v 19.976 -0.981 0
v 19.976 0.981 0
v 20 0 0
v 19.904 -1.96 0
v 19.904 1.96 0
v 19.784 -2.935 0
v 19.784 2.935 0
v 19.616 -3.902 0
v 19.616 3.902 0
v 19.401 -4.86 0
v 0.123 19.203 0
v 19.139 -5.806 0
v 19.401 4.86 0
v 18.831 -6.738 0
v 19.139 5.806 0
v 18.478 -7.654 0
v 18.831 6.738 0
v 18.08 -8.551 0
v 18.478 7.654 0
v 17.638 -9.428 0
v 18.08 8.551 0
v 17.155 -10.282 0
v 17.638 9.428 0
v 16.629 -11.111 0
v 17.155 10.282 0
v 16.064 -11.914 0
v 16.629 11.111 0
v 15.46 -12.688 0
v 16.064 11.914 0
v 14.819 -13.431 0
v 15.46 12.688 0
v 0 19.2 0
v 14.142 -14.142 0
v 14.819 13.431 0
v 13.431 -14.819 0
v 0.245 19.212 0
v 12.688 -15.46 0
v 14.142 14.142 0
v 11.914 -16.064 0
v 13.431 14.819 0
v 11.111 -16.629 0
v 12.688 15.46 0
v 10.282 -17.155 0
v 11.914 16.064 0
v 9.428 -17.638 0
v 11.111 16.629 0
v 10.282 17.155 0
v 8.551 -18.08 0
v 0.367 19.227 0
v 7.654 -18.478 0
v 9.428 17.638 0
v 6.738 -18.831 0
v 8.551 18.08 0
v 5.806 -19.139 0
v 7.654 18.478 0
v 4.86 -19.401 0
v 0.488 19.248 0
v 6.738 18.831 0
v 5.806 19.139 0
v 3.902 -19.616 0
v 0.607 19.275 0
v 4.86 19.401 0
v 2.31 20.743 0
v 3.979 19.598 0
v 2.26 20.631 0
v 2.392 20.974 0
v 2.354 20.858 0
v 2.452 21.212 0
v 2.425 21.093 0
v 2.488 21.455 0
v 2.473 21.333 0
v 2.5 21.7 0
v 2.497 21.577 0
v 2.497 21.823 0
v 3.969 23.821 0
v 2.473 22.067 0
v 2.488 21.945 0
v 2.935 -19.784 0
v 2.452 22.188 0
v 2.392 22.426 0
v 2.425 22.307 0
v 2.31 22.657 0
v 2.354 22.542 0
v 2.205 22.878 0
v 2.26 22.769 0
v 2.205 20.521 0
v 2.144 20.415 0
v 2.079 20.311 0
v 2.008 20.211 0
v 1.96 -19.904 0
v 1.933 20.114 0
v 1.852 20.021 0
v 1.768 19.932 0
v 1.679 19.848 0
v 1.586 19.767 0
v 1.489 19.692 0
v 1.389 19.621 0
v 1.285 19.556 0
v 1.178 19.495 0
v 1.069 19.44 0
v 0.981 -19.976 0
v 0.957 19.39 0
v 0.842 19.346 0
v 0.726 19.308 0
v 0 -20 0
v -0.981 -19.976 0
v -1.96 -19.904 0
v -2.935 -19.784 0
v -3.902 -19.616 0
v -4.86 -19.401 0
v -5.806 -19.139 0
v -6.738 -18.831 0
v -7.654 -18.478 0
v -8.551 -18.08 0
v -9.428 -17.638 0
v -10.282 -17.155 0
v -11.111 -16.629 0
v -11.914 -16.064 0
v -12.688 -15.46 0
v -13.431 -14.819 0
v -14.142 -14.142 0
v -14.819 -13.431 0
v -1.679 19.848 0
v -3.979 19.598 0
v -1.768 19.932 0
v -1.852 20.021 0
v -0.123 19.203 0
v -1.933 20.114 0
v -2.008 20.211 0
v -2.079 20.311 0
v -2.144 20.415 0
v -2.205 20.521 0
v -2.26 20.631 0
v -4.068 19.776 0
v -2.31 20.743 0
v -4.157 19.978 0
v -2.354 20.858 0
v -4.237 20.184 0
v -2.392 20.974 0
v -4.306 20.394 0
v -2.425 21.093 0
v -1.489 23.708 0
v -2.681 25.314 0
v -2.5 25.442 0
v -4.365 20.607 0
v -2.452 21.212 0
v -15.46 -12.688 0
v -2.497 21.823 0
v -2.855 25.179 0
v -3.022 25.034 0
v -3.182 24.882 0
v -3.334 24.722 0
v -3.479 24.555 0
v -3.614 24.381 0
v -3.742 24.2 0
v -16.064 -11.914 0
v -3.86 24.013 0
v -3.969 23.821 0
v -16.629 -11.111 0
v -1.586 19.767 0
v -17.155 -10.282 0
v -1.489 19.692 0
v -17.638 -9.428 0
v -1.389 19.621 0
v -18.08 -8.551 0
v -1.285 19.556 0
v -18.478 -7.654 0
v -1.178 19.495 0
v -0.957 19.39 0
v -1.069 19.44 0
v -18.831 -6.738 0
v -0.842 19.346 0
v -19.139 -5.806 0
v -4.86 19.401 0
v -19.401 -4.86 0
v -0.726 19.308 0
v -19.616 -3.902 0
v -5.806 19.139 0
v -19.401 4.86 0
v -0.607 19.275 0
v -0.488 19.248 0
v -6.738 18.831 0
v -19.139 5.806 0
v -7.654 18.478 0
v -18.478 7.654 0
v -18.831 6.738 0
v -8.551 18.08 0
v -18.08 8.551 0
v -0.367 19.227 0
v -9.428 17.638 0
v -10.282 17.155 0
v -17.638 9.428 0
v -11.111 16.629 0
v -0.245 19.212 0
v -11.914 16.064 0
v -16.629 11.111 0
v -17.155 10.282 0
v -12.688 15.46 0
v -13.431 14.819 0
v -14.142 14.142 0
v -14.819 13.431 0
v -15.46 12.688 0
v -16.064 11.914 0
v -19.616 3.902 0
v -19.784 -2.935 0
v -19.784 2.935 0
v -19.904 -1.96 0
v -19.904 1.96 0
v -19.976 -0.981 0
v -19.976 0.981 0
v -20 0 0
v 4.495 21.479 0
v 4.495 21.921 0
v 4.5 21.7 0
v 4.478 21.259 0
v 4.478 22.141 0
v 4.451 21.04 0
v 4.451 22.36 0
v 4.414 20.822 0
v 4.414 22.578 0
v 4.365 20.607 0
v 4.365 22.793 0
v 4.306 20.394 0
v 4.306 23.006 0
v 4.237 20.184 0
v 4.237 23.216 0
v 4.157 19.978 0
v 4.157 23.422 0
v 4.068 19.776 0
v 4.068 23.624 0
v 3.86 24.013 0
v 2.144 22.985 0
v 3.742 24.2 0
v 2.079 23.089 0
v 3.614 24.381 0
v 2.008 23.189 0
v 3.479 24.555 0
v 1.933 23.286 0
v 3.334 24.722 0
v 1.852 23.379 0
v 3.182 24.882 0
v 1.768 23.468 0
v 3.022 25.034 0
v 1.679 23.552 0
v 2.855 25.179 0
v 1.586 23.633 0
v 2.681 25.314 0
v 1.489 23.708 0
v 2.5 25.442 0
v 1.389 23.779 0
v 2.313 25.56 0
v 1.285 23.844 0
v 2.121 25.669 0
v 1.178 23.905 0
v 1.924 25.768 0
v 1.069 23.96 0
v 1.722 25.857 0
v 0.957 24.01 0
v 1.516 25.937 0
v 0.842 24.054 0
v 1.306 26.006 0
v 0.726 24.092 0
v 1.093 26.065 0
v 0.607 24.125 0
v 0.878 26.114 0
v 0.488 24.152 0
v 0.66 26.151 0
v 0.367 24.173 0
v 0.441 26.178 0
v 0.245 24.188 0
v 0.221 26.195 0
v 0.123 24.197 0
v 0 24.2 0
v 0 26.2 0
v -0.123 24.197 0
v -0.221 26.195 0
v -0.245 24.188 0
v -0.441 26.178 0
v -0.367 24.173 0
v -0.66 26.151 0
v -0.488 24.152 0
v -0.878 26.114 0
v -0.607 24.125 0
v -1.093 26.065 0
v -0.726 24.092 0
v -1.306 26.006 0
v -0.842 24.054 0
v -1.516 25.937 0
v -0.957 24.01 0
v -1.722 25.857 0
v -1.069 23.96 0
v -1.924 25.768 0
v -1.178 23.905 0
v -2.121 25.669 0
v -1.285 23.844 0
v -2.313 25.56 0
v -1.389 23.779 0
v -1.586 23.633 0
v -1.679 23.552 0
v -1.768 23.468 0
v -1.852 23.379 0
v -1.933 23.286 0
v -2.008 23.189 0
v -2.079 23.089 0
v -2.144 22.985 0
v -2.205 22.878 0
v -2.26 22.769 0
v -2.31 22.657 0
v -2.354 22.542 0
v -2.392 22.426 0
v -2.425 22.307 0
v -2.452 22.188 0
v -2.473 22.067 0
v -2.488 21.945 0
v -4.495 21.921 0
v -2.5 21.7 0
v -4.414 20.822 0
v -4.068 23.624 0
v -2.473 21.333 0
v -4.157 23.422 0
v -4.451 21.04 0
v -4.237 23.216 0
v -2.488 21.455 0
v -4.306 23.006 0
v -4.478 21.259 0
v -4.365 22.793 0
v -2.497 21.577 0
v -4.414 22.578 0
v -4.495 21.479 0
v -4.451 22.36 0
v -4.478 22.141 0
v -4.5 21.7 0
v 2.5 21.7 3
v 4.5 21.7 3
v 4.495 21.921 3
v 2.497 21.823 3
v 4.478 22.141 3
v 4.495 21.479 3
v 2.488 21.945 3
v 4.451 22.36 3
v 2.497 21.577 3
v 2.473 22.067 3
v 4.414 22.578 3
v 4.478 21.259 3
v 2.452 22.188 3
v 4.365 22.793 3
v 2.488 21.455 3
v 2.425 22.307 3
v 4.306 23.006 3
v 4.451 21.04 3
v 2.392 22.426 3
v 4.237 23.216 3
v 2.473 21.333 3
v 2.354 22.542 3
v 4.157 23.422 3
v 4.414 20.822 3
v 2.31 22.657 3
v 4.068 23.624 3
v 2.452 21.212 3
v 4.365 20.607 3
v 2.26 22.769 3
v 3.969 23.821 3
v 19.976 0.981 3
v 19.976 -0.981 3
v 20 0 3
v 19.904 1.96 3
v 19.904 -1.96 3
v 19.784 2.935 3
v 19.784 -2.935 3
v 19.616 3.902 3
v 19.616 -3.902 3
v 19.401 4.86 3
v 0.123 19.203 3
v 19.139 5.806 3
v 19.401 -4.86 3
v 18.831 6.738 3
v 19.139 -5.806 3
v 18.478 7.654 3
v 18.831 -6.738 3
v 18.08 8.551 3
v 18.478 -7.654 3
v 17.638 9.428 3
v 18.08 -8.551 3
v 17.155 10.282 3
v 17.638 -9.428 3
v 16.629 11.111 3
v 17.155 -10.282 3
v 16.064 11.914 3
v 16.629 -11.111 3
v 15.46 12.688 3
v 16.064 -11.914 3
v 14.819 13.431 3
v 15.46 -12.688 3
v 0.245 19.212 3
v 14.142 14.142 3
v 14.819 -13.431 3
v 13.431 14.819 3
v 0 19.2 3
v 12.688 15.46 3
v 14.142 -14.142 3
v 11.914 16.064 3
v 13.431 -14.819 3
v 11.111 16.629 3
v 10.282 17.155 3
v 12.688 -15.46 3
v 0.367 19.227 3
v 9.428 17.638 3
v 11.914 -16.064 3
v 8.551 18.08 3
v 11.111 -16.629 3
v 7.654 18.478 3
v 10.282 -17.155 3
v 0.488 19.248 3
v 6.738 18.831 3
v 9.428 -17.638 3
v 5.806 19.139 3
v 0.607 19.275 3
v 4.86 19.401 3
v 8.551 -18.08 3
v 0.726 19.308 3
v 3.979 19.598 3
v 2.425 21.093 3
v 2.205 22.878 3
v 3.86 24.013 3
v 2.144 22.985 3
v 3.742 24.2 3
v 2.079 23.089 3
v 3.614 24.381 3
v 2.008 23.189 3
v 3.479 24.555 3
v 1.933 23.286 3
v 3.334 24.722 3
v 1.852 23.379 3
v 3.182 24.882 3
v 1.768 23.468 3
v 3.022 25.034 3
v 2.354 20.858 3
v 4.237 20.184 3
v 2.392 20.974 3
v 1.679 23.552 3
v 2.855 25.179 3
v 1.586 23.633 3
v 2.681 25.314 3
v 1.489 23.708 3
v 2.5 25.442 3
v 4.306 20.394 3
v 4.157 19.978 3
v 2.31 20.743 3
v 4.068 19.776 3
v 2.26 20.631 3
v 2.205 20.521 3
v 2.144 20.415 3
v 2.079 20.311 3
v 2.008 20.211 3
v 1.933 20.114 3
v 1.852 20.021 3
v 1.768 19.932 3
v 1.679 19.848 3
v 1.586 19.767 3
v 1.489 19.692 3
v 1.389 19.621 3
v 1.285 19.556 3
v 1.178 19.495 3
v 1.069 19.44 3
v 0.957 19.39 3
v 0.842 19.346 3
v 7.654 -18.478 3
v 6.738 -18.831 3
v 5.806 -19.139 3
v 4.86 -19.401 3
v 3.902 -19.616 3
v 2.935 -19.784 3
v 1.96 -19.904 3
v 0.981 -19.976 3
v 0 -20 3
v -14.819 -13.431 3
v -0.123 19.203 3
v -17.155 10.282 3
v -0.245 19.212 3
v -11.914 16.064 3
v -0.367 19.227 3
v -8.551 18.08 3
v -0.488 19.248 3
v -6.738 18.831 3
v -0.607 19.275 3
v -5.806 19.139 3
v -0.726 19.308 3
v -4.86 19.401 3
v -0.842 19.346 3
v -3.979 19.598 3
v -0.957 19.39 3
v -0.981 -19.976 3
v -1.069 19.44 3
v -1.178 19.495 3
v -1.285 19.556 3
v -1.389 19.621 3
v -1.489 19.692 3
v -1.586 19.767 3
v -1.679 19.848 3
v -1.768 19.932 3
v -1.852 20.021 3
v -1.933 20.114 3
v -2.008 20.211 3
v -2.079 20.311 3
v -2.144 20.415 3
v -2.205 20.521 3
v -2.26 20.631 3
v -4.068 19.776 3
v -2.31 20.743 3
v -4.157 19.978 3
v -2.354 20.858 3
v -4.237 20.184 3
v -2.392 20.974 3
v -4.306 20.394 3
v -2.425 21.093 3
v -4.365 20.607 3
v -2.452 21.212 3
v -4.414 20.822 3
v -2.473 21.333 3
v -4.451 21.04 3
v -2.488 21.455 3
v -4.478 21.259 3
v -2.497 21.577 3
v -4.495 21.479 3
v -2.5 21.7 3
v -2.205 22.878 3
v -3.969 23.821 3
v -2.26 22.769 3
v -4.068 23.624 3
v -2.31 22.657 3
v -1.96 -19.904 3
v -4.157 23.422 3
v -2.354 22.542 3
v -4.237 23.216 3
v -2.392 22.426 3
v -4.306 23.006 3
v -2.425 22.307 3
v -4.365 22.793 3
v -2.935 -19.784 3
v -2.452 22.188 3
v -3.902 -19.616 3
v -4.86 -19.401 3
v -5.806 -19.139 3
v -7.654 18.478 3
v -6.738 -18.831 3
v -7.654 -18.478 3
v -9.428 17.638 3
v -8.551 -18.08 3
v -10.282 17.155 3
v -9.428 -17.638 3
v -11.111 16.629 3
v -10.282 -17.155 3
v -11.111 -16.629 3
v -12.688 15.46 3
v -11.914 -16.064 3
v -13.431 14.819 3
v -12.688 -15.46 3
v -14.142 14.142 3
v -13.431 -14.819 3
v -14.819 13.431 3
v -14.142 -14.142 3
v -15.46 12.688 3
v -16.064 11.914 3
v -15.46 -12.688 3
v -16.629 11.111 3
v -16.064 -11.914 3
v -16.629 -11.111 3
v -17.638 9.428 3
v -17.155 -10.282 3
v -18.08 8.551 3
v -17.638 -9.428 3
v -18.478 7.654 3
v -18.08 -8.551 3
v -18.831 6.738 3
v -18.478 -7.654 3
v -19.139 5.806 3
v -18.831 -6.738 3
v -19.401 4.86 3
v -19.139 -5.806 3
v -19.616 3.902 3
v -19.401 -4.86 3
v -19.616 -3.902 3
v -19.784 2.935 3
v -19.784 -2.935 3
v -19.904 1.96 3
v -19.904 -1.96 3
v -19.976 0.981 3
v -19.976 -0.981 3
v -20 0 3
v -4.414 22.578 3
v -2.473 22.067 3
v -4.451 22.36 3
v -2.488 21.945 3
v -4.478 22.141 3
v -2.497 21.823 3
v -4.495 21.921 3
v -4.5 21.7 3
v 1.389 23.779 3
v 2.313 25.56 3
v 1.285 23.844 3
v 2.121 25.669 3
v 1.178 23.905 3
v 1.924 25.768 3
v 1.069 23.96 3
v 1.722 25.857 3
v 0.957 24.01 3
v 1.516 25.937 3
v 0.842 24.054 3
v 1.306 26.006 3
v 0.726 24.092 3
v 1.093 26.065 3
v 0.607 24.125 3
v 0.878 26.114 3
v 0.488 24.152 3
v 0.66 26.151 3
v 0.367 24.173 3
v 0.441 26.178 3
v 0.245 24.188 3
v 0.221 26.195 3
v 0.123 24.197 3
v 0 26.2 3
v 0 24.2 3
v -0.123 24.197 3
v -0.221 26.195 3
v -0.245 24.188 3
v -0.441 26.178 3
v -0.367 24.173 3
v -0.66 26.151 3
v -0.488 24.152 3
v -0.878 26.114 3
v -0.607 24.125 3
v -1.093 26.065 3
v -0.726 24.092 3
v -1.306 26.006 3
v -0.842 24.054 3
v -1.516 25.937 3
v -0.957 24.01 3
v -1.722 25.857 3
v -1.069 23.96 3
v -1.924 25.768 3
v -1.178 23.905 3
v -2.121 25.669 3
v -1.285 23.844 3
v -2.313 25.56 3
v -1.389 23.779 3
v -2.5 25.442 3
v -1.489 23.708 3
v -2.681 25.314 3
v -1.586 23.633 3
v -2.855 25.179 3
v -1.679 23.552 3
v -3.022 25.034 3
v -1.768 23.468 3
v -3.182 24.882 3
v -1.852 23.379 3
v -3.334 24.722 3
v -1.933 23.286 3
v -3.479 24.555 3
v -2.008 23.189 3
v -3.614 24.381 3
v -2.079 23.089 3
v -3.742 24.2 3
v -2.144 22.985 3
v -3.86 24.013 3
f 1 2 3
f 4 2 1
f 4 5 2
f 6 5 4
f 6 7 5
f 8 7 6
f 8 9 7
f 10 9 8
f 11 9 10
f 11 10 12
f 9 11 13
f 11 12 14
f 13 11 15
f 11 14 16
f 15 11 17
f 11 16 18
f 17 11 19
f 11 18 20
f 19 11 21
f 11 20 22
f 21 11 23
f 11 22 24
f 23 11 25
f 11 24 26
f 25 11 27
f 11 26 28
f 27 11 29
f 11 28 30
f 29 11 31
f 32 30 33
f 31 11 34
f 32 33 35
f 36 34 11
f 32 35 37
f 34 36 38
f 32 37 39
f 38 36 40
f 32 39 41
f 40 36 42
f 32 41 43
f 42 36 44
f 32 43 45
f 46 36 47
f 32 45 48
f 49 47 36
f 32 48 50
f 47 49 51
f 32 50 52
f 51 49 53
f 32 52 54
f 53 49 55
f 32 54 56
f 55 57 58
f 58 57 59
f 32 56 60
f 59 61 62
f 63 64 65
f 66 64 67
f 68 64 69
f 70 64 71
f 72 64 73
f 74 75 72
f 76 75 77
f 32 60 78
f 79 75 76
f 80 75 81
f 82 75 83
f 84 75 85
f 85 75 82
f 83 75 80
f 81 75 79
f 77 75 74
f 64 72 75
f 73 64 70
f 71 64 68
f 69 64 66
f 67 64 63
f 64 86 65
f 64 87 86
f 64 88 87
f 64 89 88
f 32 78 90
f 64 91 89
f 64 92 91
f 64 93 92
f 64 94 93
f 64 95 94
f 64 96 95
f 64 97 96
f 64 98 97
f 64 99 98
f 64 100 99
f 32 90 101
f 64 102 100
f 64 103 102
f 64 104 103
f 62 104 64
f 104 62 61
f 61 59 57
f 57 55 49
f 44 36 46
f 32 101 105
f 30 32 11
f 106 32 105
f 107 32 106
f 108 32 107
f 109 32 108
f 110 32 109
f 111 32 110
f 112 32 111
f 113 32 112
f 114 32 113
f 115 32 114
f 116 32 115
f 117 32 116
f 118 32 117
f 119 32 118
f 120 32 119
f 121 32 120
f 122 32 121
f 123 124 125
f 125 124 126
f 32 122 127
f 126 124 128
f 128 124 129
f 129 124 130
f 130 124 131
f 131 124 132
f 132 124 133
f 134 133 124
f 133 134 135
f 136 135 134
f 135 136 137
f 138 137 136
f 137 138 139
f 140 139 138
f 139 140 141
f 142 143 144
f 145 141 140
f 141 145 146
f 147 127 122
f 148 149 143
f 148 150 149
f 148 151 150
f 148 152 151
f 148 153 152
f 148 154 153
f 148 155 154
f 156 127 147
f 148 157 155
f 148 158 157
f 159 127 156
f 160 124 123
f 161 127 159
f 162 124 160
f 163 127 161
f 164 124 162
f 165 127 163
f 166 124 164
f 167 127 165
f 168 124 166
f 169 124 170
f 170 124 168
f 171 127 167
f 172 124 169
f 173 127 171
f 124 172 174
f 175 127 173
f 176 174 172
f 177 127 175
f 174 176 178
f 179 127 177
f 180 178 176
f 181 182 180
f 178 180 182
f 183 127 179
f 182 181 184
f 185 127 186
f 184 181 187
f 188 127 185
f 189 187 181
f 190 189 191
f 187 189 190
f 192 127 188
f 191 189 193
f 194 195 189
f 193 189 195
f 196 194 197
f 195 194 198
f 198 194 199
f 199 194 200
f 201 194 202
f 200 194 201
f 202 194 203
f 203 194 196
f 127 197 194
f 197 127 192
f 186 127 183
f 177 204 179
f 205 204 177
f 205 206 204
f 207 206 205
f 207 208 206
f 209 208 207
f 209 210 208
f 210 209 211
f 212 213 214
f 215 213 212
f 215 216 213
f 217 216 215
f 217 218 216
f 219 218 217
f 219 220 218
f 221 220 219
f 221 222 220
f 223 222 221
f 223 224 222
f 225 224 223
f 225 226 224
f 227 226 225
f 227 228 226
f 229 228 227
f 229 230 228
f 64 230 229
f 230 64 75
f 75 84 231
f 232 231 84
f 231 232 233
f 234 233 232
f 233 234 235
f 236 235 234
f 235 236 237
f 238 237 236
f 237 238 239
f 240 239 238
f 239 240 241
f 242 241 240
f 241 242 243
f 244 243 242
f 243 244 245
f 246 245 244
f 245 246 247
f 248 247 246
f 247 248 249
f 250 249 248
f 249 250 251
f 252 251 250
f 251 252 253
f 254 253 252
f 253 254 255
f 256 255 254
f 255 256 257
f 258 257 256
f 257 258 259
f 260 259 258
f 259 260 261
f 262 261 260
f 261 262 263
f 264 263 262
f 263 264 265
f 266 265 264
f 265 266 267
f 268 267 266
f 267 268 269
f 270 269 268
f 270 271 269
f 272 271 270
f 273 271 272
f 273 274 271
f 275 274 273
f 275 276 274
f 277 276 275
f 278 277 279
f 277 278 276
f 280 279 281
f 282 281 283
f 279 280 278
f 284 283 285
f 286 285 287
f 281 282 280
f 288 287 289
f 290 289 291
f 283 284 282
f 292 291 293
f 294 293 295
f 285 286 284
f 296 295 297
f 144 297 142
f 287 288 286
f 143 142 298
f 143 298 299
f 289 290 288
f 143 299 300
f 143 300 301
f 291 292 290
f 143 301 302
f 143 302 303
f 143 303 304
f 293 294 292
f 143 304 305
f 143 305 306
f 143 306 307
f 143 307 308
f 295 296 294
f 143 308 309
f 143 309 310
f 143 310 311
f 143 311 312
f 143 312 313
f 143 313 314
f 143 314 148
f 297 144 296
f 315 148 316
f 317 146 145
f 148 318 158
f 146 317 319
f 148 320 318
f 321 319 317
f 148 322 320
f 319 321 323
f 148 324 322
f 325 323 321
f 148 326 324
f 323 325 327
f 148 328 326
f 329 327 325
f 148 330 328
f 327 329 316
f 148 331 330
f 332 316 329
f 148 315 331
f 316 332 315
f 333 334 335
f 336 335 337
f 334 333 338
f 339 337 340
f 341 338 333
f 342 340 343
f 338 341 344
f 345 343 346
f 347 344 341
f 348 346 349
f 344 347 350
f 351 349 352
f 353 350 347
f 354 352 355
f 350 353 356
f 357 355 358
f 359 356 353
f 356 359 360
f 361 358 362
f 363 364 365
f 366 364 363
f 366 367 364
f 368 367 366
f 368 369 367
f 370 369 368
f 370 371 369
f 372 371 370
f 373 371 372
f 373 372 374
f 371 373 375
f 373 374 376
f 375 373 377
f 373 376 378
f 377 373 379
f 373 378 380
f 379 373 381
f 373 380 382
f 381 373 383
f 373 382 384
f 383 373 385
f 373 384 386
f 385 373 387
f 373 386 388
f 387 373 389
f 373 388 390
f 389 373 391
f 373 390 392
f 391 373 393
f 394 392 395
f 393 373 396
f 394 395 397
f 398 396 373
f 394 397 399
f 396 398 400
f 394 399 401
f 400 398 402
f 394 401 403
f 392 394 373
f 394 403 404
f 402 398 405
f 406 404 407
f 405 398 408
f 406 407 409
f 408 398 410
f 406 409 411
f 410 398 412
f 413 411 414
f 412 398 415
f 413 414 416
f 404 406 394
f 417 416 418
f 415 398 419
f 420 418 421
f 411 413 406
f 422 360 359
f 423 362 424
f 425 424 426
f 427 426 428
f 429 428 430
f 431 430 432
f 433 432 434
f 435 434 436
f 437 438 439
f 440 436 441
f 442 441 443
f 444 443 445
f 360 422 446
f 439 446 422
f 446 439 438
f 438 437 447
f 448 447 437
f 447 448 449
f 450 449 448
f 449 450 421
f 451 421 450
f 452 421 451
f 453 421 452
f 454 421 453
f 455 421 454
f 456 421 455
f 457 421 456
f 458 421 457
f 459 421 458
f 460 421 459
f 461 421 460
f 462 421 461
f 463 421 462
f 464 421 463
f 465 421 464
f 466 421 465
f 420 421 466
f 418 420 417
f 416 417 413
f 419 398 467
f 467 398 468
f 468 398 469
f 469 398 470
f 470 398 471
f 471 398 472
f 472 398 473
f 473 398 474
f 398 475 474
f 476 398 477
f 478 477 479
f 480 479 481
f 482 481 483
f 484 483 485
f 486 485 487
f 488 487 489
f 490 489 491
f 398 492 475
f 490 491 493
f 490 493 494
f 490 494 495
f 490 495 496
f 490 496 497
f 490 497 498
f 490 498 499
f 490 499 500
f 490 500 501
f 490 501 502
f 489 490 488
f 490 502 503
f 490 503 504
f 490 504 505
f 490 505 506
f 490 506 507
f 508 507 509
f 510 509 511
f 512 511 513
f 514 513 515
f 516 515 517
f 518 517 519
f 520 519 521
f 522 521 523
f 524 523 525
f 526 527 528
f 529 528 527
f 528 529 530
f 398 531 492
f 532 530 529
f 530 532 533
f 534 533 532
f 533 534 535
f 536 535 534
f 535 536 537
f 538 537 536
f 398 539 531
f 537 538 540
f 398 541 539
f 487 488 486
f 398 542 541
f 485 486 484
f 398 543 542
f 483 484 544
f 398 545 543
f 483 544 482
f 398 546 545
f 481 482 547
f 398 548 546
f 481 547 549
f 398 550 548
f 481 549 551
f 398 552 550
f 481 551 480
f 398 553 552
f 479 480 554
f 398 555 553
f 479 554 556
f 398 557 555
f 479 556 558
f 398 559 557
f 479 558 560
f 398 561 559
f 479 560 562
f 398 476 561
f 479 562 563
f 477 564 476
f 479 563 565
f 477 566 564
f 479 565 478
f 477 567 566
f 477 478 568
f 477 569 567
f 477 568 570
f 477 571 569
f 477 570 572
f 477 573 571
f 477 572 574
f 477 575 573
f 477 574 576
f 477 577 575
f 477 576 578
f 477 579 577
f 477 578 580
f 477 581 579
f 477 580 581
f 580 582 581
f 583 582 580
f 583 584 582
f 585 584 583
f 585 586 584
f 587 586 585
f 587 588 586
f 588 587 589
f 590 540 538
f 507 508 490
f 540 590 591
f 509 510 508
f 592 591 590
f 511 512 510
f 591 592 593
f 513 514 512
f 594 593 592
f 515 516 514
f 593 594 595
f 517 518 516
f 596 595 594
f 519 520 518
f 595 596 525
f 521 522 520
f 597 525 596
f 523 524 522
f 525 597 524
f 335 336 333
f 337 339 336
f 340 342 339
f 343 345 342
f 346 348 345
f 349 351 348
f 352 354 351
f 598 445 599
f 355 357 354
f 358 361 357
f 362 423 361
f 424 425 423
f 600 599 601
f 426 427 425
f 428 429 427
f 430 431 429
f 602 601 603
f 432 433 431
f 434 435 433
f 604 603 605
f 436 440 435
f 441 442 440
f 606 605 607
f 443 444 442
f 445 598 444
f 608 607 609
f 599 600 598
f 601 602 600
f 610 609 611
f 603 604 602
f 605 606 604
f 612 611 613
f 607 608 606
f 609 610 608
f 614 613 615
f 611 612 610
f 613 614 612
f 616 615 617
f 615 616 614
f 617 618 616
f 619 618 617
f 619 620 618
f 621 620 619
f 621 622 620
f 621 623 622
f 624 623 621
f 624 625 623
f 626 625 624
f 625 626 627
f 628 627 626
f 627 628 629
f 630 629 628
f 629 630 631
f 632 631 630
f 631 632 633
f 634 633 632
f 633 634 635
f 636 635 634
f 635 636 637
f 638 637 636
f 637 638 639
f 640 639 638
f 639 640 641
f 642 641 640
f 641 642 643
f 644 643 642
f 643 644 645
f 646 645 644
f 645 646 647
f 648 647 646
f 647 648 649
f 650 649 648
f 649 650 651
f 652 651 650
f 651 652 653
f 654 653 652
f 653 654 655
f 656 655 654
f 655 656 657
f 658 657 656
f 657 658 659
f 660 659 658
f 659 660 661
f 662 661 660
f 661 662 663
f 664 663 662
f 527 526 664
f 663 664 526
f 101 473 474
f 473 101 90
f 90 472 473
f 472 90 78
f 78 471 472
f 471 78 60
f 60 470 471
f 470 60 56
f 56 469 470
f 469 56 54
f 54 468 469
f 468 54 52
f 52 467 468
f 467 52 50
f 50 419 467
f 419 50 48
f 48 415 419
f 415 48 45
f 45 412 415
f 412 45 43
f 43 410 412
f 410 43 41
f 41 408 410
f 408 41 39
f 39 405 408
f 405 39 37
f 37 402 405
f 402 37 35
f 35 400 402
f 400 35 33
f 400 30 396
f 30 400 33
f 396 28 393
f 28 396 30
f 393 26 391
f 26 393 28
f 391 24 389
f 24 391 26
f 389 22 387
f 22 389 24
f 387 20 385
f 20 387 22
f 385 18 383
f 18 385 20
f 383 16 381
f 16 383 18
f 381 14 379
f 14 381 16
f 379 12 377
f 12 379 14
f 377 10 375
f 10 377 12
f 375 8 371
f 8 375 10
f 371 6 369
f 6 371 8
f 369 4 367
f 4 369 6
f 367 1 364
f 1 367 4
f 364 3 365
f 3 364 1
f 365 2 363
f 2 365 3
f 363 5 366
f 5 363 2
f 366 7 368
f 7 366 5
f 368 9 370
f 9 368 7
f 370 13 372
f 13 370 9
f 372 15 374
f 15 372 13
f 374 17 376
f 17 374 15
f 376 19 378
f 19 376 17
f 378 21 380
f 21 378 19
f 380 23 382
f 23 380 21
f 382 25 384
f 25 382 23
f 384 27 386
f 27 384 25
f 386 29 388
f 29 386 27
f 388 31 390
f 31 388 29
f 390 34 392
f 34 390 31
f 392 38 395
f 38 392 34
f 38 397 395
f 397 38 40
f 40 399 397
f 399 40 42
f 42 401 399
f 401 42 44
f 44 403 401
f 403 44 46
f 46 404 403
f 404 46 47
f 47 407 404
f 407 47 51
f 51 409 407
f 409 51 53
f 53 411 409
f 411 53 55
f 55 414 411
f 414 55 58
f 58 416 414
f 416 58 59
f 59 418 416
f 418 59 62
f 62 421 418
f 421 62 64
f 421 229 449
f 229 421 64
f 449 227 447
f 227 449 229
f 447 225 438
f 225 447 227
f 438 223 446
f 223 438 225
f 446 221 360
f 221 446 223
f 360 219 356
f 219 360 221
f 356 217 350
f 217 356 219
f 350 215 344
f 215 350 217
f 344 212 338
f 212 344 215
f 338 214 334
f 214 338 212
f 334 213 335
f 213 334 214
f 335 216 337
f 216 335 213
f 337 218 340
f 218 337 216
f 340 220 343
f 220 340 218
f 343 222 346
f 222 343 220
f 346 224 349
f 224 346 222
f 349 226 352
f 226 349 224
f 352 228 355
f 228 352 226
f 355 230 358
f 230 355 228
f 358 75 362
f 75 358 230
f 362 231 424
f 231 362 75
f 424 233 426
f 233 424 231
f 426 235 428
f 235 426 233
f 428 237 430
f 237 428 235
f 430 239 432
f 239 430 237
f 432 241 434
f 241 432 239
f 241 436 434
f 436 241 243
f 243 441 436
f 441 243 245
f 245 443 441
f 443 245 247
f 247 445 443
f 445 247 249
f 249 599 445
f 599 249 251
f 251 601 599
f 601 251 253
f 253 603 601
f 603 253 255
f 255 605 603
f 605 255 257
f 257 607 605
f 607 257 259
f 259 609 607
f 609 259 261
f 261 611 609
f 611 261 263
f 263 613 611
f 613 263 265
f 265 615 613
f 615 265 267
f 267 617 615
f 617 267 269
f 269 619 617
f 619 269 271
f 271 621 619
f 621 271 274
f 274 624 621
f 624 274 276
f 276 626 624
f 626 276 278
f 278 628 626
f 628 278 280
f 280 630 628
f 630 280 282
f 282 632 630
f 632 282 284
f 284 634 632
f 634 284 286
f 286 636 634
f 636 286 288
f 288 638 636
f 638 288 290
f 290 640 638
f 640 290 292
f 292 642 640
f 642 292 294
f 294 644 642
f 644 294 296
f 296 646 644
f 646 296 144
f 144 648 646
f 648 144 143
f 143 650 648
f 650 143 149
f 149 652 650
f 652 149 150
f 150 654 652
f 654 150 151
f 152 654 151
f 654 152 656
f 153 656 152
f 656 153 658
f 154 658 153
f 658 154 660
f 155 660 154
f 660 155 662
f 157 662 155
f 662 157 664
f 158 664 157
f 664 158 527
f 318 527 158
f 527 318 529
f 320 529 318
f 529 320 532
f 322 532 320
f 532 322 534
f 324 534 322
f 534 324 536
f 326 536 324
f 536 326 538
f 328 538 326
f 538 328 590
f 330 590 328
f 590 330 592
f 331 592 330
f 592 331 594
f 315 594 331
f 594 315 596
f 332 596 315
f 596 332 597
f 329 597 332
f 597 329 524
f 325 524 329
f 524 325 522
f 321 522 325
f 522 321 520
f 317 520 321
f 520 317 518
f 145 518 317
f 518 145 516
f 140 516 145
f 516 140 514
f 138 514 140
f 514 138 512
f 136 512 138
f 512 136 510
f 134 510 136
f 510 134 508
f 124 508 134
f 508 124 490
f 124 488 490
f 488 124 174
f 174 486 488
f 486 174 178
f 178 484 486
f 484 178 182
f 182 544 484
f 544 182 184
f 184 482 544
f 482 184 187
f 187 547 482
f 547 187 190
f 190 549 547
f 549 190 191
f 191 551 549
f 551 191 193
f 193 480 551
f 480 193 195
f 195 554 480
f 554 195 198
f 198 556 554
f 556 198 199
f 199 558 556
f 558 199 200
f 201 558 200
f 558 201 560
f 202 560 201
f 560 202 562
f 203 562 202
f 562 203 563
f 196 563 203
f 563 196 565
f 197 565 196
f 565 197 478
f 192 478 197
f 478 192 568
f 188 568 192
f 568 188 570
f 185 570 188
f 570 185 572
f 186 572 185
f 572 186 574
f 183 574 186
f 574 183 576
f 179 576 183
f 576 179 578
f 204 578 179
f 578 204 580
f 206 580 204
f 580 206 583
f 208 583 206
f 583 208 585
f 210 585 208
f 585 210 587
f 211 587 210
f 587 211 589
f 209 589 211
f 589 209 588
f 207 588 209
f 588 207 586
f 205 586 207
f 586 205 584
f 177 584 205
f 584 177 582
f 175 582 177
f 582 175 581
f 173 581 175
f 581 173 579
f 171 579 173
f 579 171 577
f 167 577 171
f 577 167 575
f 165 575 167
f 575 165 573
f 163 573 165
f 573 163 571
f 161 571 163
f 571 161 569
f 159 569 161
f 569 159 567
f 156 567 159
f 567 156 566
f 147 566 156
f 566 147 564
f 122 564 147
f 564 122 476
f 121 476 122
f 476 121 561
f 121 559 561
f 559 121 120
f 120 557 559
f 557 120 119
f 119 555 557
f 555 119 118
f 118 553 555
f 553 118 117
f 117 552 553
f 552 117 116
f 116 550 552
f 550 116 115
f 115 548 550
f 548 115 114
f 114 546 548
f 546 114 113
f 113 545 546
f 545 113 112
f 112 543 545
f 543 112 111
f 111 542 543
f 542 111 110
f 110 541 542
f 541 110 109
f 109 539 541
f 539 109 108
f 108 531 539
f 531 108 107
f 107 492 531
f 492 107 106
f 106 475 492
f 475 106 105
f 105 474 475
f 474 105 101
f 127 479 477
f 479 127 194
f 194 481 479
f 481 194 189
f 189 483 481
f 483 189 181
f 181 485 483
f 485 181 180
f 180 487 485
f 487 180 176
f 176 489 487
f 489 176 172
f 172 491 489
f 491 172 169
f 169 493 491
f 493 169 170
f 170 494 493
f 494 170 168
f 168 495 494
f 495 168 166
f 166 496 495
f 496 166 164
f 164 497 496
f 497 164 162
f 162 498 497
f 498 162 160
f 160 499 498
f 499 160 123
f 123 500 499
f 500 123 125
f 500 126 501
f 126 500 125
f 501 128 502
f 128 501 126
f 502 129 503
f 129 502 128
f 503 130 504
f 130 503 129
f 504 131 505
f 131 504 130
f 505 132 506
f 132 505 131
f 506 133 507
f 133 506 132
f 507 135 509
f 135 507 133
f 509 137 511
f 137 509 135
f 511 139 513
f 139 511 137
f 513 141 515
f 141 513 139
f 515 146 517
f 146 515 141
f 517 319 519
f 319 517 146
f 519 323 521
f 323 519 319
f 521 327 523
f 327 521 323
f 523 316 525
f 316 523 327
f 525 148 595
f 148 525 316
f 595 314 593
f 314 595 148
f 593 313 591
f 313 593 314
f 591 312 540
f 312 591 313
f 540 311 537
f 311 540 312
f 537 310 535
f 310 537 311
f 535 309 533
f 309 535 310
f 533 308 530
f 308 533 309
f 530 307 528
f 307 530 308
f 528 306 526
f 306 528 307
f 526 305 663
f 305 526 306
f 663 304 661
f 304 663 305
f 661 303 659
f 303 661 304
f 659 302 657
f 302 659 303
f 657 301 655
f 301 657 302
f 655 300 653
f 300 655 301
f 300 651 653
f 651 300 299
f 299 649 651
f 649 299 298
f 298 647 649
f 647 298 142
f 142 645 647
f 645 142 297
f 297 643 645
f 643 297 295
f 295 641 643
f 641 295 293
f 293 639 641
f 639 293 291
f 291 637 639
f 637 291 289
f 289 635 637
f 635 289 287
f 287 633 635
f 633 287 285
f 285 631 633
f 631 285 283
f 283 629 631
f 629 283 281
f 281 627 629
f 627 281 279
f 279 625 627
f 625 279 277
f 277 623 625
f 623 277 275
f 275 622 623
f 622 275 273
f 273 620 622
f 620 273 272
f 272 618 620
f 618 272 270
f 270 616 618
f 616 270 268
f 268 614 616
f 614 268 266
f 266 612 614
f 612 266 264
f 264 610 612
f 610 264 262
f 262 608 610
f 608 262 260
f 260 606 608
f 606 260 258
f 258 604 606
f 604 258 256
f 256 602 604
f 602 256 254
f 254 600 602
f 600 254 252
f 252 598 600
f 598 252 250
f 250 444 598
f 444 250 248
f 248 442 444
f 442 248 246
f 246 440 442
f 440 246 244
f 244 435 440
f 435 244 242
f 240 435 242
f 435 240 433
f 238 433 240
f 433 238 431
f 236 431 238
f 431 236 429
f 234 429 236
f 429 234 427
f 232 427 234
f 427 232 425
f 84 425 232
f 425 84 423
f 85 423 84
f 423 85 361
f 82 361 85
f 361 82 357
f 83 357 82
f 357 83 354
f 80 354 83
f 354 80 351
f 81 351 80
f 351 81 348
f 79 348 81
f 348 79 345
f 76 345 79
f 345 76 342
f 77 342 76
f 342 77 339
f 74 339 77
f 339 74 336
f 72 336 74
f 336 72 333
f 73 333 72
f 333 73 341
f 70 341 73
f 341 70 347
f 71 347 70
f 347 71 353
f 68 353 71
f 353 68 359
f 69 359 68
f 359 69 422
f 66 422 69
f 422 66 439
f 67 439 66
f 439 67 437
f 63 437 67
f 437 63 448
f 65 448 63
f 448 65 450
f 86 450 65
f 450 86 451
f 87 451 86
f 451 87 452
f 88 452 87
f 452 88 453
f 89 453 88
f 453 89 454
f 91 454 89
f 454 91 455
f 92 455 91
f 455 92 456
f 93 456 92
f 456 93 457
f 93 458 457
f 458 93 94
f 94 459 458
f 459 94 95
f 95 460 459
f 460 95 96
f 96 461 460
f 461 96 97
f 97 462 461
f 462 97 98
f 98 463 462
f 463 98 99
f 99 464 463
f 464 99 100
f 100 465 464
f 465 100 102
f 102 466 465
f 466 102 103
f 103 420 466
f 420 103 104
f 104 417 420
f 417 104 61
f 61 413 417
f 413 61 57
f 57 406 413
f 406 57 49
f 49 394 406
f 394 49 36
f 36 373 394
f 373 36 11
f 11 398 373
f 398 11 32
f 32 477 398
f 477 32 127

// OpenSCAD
// ============================================================================
// Car Logo Keyring Pendant Generator
// ============================================================================
// Parametric pendant: a round disc with a keyring loop at the top, and a car
// logo either embossed (raised) or engraved (recessed) into the top face.
//
// This file is normally driven by generate.py, which invokes OpenSCAD once
// per brand/variant via -D command line overrides. It can also be opened
// directly in the OpenSCAD GUI to preview/tweak a single logo (edit the
// "single-run defaults" block below).
//
// Variants (set via `variant`):
//   "emboss"  -> single-piece pendant, logo raised above the top face.
//   "base"    -> single-piece pendant, logo recessed (cut) into the top face.
//                Prints as the "body" color for MMU / colour-change prints.
//   "inlay"   -> just the logo, extruded to exactly fill the "base" cavity.
//                Prints as the "logo" color; loads at the SAME coordinates
//                as "base" so both STLs can be imported together (e.g. as
//                separate objects in PrusaSlicer/OrcaSlicer / a multi-part
//                3MF) and they will align without any manual positioning.
//   "preview" -> base (grey) + inlay (colour) shown together, for a quick
//                visual sanity check of logo scale/centering in the GUI.
// ============================================================================

/* [Pendant] */
pendant_d      = 40;    // overall pendant diameter (mm)
base_h         = 3.0;   // base disc thickness (mm)

/* [Keyring loop] */
ring_id        = 5;     // keyring loop inner diameter (mm) - fits a standard split ring
ring_od        = 9;     // keyring loop outer diameter (mm)
ring_h         = base_h;// loop thickness (mm), defaults to base thickness
ring_overlap   = 0.8;   // how far the loop's inner circle bites into the disc's
                         // outer circle, in mm. 0 = the loop ID exactly touches
                         // the disc OD at a single tangent point (fragile, not
                         // recommended for printing). ~0.6-1.0mm gives a solid
                         // printable weld between loop and disc.

/* [Logo] */
logo_svg       = "";    // path to the logo SVG, e.g. "logos/toyota.svg". Empty = blank disc.
logo_margin    = 3;     // gap (mm) between the logo's fitted bounding circle and the pendant edge
logo_size      = 0;     // explicit bounding-circle diameter (mm), overriding logo_margin. 0 = auto
logo_aspect_w  = 1;     // content bounding-box width (auto-computed by generate.py; only the
logo_aspect_h  = 1;     // aspect_w:aspect_h ratio matters, not absolute units)
logo_y_offset  = 0;     // manual nudge, mm, for logos whose visual center isn't their bbox center
logo_x_offset  = 0;
logo_rotate    = 0;     // manual rotation in degrees, for SVGs that import sideways/upside-down
emboss_h       = 1.0;   // how far the logo stands proud of the top face (mm), emboss variant
engrave_d      = 1.0;   // how deep the logo is cut into the top face (mm), base/inlay variant

/* [Render] */
variant        = "preview"; // "emboss" | "base" | "inlay" | "preview"
$fn            = 128;

// ----------------------------------------------------------------------------
// Derived geometry
// ----------------------------------------------------------------------------
pendant_r = pendant_d / 2;
ring_ir   = ring_id / 2;
ring_or   = ring_od / 2;
ring_cy   = pendant_r + ring_ir - ring_overlap; // loop center, along +Y

// Diameter of the circle the logo's bounding-box diagonal must fit within.
// logo_size > 0 overrides the auto (pendant-relative) value.
logo_fit_d    = (logo_size > 0) ? logo_size : (pendant_d - 2 * logo_margin);
// Split logo_fit_d between width/height in proportion to the content's own
// aspect ratio, such that target_w^2 + target_h^2 = logo_fit_d^2 exactly.
// resize() below then forces the *actual* geometry to exactly these
// dimensions - so the diagonal-fits-in-a-circle guarantee holds regardless
// of any approximation error in how logo_aspect_w/h were measured.
_logo_aspect_norm = sqrt(logo_aspect_w * logo_aspect_w + logo_aspect_h * logo_aspect_h);
logo_target_w = logo_fit_d * logo_aspect_w / _logo_aspect_norm;
logo_target_h = logo_fit_d * logo_aspect_h / _logo_aspect_norm;

// ----------------------------------------------------------------------------
// 2D profile: disc + keyring loop, with the loop hole punched through the
// final union so it stays a clean through-hole even where it overlaps the
// disc's own edge.
// ----------------------------------------------------------------------------
module pendant_outline_2d() {
    difference() {
        union() {
            circle(r = pendant_r);
            translate([0, ring_cy]) circle(r = ring_or);
        }
        translate([0, ring_cy]) circle(r = ring_ir);
    }
}

// ----------------------------------------------------------------------------
// Logo footprint, imported from SVG and scaled (aspect ratio preserved) so
// its bounding box is exactly logo_target_w x logo_target_h - sized so that
// box's diagonal equals logo_fit_d, guaranteeing it fits within a circle of
// that diameter no matter the logo's shape. Centered at origin.
// ----------------------------------------------------------------------------
module logo_2d() {
    if (logo_svg != "") {
        translate([logo_x_offset, logo_y_offset])
        rotate([0, 0, logo_rotate])
        resize([logo_target_w, logo_target_h, 0], auto = [false, false, true])
            import(logo_svg, center = true);
    }
}

// ----------------------------------------------------------------------------
// Solids
// ----------------------------------------------------------------------------
module pendant_base_solid() {
    linear_extrude(height = base_h)
        pendant_outline_2d();
}

module logo_emboss_solid() {
    translate([0, 0, base_h])
        linear_extrude(height = emboss_h)
            logo_2d();
}

// Slightly overshoots top/bottom of the cut so the subtraction leaves a
// clean face with no coincident (zero-thickness) surfaces.
module logo_cavity_cutter() {
    eps = 0.02;
    translate([0, 0, base_h - engrave_d])
        linear_extrude(height = engrave_d + eps)
            logo_2d();
}

// The plug that exactly fills the engraved cavity - same footprint, no
// eps overshoot, so it sits flush with the top face when inserted.
module logo_inlay_solid() {
    translate([0, 0, base_h - engrave_d])
        linear_extrude(height = engrave_d)
            logo_2d();
}

module pendant_emboss() {
    union() {
        pendant_base_solid();
        logo_emboss_solid();
    }
}

module pendant_engraved_base() {
    difference() {
        pendant_base_solid();
        logo_cavity_cutter();
    }
}

// ----------------------------------------------------------------------------
// Output selection
// ----------------------------------------------------------------------------
if (variant == "emboss") {
    pendant_emboss();
} else if (variant == "base") {
    pendant_engraved_base();
} else if (variant == "inlay") {
    logo_inlay_solid();
} else {
    // preview: base in grey, inlay in a contrasting color, shown together
    color("lightgrey") pendant_engraved_base();
    color("crimson")   logo_inlay_solid();
}
